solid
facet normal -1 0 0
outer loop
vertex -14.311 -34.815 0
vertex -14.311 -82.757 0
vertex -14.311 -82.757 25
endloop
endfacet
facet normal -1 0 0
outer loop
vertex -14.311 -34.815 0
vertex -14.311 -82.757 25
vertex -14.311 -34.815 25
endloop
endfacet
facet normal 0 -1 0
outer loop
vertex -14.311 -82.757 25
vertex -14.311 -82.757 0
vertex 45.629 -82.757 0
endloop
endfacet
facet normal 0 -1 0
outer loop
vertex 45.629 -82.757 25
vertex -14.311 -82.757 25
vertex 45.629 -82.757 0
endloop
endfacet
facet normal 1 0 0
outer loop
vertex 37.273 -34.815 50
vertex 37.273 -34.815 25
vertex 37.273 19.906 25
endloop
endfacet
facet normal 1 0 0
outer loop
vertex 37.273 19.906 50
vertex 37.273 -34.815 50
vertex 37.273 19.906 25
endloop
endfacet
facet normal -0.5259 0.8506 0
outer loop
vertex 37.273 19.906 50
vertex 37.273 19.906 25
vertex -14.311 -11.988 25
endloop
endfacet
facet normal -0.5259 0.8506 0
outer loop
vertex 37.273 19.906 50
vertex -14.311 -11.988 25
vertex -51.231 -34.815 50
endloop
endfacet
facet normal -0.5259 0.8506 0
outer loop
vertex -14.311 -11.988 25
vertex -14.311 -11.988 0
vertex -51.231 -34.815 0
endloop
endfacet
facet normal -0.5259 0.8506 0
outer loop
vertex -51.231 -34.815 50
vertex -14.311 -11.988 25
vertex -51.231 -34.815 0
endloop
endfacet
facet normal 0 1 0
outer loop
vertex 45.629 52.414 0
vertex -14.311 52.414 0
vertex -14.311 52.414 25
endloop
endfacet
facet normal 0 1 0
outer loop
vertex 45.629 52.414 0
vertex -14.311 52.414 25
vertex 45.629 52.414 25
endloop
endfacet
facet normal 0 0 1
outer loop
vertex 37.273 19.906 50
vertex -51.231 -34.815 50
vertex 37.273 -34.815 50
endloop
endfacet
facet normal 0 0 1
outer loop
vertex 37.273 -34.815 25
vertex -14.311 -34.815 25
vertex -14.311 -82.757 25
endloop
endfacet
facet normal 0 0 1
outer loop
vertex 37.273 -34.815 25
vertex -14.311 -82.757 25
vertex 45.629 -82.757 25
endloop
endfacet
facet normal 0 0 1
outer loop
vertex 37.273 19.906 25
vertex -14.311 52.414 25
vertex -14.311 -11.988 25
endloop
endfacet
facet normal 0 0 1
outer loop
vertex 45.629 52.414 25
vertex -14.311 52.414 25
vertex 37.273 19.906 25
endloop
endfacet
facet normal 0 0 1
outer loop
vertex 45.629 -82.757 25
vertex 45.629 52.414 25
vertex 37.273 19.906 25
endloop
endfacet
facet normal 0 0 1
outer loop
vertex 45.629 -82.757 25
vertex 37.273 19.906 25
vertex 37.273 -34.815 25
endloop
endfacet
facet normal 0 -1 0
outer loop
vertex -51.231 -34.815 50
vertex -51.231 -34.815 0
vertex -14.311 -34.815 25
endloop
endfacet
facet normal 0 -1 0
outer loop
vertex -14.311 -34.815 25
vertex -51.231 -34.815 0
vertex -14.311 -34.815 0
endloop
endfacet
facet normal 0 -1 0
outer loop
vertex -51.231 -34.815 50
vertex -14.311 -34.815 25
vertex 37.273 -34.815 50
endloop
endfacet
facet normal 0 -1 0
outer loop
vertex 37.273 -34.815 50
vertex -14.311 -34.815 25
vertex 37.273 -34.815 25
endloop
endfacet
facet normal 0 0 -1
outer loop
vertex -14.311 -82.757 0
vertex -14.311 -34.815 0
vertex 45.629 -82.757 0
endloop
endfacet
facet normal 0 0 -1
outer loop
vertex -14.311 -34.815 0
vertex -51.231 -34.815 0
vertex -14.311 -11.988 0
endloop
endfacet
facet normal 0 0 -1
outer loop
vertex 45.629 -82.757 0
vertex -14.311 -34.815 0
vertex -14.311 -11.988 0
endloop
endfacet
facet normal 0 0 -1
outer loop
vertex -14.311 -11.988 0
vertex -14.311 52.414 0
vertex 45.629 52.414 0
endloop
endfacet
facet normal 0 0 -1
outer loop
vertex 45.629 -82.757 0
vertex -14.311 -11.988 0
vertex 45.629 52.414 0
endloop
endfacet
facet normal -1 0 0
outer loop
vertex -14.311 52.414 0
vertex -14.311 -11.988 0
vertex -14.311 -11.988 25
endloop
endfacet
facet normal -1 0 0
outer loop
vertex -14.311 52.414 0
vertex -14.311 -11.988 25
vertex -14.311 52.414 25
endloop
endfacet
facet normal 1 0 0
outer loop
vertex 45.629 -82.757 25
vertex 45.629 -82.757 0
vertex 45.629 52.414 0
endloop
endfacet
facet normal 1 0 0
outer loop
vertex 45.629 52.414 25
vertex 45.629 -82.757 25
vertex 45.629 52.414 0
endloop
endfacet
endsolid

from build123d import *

# Parameters (mm, degrees)
F1_DEPTH = 50
F2_W     = 59.939869
F2_H     = 135.170739
F3_DEPTH = 25


with BuildPart() as f1:
    # F0 (on Top) → F1 (new body)
    with BuildSketch(Plane.XY):
        Polygon((37.273418, 19.90559), (-51.23112, -34.814954), (37.273418, -34.814954), align=None)
    extrude(amount=F1_DEPTH)

    # F2 (on Top) → F3 (join)
    with BuildSketch(Plane.XY):
        with Locations((15.658964, -15.171492)):
            Rectangle(F2_W, F2_H)
    extrude(amount=F3_DEPTH)


solid = f1.part
